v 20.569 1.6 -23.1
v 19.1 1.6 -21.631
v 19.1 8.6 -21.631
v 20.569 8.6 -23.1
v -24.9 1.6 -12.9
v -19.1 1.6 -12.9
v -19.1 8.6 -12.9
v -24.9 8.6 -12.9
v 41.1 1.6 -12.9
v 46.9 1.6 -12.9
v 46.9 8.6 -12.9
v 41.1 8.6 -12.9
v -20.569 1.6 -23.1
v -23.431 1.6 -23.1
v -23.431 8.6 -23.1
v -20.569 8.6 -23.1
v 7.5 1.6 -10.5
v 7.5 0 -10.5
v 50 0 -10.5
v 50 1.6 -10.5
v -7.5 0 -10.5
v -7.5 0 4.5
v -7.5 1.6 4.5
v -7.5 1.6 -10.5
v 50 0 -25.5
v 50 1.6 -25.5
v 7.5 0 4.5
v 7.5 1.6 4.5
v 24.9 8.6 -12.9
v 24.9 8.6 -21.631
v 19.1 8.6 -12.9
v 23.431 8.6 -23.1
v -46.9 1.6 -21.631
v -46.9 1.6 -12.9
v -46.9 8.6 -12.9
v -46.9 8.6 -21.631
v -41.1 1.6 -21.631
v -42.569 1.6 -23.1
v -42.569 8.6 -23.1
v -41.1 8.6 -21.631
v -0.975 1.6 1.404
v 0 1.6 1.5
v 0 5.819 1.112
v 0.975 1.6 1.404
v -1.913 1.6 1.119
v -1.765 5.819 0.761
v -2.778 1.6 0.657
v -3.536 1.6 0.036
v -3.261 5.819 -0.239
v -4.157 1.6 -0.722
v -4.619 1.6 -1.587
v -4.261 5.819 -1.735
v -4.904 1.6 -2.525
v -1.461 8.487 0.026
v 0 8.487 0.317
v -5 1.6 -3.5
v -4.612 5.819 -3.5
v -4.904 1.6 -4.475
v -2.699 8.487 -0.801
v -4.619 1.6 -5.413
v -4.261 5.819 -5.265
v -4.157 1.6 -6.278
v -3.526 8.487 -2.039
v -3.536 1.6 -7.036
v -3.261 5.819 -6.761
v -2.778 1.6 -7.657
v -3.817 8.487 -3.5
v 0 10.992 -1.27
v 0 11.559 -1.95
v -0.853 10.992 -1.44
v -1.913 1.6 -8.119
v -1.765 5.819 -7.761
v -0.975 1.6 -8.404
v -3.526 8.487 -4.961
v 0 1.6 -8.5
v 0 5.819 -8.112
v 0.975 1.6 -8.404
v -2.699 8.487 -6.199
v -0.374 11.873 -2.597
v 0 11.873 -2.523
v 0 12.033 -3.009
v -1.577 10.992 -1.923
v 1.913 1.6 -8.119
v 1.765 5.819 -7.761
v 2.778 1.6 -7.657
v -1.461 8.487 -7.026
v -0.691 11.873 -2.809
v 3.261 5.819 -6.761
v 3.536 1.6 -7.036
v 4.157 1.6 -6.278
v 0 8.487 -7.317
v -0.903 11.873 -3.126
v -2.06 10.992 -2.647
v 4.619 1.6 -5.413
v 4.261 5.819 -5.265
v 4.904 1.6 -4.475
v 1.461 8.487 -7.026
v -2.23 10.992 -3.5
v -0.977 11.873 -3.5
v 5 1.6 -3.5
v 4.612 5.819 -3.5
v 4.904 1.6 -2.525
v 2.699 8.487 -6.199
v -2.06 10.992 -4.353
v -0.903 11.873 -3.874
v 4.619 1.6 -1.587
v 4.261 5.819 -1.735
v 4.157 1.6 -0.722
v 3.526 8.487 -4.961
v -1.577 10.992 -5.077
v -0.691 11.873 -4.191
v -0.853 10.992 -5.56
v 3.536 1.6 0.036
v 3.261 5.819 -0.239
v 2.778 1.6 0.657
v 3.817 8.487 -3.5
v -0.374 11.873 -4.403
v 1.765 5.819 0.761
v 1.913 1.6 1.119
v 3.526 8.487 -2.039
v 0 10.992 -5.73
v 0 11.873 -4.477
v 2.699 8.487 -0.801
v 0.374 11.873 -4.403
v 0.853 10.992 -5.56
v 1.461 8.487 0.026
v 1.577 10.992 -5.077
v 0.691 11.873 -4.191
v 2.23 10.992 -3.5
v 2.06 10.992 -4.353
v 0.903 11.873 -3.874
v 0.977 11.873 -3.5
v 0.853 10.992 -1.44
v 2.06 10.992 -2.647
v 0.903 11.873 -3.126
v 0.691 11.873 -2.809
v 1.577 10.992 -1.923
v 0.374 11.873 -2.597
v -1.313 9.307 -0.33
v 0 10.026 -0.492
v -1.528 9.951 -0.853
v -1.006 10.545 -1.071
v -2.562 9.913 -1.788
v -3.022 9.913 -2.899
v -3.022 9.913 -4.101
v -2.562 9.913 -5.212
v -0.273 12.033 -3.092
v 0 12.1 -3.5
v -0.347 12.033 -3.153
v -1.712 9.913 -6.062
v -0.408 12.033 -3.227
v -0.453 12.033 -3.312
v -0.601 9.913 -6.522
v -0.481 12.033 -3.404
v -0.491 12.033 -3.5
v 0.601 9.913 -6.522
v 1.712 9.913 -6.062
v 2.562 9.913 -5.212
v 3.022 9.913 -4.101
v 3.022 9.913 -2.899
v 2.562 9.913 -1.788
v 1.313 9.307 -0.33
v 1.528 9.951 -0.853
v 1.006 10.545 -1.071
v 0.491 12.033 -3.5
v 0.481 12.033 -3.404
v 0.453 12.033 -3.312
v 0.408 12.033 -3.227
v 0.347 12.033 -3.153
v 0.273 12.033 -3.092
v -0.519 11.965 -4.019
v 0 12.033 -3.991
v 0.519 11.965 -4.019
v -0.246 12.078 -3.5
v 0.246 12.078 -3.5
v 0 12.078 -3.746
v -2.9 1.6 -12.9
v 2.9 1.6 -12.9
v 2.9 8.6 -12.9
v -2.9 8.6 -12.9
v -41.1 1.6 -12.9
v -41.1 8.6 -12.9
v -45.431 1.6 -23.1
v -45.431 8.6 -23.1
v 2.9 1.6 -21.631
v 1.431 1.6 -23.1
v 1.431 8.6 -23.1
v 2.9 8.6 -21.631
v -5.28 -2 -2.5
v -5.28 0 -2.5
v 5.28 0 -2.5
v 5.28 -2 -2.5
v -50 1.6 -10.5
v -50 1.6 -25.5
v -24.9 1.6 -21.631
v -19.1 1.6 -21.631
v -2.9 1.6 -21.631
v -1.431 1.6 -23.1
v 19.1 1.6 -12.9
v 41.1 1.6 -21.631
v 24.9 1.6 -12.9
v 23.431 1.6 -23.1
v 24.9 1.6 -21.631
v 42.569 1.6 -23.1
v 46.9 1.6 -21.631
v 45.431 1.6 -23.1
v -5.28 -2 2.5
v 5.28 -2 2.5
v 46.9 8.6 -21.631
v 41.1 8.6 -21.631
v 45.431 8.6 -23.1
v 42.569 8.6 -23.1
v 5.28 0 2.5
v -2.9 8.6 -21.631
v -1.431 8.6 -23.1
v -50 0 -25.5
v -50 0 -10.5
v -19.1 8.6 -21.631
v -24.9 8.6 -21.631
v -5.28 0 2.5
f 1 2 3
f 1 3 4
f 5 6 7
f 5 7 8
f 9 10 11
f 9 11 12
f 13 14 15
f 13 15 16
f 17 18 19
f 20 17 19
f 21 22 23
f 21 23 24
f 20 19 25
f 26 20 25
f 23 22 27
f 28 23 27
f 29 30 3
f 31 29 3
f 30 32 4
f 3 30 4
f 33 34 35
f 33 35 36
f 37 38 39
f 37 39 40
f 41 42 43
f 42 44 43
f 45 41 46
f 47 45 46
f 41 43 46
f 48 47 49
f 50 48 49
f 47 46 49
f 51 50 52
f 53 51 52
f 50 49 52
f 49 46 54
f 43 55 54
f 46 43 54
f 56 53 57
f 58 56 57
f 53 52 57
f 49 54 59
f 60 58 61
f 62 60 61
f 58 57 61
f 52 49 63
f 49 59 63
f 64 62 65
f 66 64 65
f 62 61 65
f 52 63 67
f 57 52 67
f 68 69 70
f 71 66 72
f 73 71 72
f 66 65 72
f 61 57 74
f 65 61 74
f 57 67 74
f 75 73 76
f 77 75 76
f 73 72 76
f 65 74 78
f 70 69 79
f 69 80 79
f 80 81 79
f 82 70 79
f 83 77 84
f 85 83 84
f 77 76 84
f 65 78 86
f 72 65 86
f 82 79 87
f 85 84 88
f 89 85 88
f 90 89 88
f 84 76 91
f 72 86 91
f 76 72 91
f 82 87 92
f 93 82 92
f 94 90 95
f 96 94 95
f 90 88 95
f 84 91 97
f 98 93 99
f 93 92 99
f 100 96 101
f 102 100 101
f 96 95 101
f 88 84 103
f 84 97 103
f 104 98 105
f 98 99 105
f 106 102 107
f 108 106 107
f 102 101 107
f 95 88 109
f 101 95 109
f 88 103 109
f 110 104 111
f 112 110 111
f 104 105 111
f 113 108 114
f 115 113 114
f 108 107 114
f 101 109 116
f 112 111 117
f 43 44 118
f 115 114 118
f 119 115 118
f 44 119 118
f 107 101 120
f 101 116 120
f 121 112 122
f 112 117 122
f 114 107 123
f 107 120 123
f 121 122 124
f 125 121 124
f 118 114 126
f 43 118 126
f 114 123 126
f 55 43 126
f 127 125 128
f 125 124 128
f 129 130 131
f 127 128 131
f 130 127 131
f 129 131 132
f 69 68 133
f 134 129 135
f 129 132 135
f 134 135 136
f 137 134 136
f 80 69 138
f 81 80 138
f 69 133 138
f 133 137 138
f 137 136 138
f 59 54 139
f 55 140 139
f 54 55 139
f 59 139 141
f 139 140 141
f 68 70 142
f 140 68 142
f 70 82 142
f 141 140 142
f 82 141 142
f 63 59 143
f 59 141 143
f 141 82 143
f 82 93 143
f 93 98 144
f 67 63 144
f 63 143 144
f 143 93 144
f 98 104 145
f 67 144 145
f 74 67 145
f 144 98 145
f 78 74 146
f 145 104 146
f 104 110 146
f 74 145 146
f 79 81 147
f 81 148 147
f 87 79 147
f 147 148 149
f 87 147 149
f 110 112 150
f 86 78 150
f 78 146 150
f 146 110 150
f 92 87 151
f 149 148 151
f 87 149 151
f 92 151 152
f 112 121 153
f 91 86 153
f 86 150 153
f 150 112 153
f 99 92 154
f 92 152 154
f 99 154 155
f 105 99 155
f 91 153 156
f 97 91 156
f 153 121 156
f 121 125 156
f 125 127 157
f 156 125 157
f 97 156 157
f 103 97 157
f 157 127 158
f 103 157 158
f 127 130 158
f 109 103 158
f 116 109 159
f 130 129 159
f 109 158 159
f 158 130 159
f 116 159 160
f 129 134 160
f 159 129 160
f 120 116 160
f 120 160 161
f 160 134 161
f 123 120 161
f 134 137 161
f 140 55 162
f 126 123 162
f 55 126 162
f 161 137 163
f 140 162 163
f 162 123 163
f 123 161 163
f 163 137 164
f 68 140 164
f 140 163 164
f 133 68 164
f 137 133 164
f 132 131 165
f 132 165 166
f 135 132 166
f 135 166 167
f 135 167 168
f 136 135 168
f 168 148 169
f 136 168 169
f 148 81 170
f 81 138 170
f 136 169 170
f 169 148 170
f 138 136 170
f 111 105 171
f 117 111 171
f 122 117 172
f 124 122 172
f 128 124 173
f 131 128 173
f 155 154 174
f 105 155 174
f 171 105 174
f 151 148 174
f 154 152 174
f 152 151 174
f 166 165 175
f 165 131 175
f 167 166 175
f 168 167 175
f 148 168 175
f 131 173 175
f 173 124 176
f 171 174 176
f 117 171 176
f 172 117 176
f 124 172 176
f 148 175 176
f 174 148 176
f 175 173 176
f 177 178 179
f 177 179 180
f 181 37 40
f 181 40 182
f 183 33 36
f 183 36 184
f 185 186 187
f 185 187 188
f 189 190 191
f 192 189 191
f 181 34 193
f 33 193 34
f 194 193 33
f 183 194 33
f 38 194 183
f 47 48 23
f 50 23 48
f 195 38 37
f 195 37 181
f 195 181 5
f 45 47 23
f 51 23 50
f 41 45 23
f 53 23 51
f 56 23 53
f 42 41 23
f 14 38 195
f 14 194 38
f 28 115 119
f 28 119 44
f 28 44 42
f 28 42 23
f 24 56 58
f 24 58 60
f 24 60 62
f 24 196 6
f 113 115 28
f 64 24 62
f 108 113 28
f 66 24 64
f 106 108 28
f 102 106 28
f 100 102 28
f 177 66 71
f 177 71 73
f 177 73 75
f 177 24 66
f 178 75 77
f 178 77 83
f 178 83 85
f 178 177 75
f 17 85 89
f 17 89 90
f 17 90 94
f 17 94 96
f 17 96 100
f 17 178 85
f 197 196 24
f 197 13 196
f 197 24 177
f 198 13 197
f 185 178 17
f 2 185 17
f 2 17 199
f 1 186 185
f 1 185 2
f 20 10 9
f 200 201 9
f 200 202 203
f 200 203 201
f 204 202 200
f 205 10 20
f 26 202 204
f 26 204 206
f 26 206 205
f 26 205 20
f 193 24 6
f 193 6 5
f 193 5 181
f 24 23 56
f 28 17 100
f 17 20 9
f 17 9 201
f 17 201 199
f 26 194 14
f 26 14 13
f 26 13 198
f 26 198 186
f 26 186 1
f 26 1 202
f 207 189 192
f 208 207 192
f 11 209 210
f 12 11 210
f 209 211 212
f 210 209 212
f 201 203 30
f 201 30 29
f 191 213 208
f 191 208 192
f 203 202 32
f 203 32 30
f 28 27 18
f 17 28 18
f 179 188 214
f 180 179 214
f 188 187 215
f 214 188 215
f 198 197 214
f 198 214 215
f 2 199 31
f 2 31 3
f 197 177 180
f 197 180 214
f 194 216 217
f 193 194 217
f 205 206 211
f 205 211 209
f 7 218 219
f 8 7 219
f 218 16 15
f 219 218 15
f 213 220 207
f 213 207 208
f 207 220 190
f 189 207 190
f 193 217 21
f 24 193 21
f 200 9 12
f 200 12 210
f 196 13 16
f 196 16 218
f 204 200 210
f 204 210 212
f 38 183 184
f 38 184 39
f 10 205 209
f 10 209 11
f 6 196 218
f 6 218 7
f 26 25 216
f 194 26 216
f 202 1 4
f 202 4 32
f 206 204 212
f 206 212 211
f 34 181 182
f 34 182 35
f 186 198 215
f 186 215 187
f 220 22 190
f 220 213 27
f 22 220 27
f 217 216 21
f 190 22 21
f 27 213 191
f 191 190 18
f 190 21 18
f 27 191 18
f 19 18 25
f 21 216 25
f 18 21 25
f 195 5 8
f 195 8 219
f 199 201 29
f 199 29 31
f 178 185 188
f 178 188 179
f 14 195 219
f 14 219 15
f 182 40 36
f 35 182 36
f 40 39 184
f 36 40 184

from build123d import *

# Parameters (mm, degrees)
BOSS_EXTRUDE1_DEPTH = 1.6
SKETCH1_3_W         = 10.56
SKETCH1_3_H         = 5
BOSS_EXTRUDE2_DEPTH = 2
BOSS_EXTRUDE3_DEPTH = 8.6


with BuildPart() as part:
    # Sketch1 → Boss-Extrude1 (new body)
    with BuildSketch(Plane(origin=(0, 0, 0), x_dir=(1, 0, 0), z_dir=(0, 1, 0))):
        Polygon((-7.5, 10.5), (-7.5, -4.5), (7.5, -4.5), (7.5, 10.5), (50, 10.5), (50, 25.5), (-50, 25.5), (-50, 10.5), align=None)
        Polygon((46.9, 21.630697763), (46.9, 12.9), (41.1, 12.9), (41.1, 21.630697763), (42.569302237, 23.1), (45.430697763, 23.1), align=None, mode=Mode.SUBTRACT)
        Polygon((-42.569302237, 23.1), (-41.1, 21.630697763), (-41.1, 12.9), (-46.9, 12.9), (-46.9, 21.630697763), (-45.430697763, 23.1), align=None, mode=Mode.SUBTRACT)
        Polygon((-20.569302237, 23.1), (-19.1, 21.630697763), (-19.1, 12.9), (-24.9, 12.9), (-24.9, 21.630697763), (-23.430697763, 23.1), align=None, mode=Mode.SUBTRACT)
        Polygon((2.9, 12.9), (-2.9, 12.9), (-2.9, 21.630697763), (-1.430697763, 23.1), (1.430697763, 23.1), (2.9, 21.630697763), align=None, mode=Mode.SUBTRACT)
        Polygon((23.430697763, 23.1), (24.9, 21.630697763), (24.9, 12.9), (19.1, 12.9), (19.1, 21.630697763), (20.569302237, 23.1), align=None, mode=Mode.SUBTRACT)
    extrude(amount=BOSS_EXTRUDE1_DEPTH)

    # Sketch1<3> → Boss-Extrude2 (add)
    with BuildSketch(Plane(origin=(0, 0, 0), x_dir=(1, 0, 0), z_dir=(0, 1, 0))):
        Rectangle(SKETCH1_3_W, SKETCH1_3_H)
    extrude(amount=-BOSS_EXTRUDE2_DEPTH)

    # Sketch1<4> → Boss-Extrude3 (add)
    with BuildSketch(Plane(origin=(0, 0, 0), x_dir=(1, 0, 0), z_dir=(0, 1, 0))):
        Polygon((-2.9, 21.630697763), (-2.9, 12.9), (2.9, 12.9), (2.9, 21.630697763), (1.430697763, 23.1), (-1.430697763, 23.1), align=None)
        Polygon((24.9, 12.9), (24.9, 21.630697763), (23.430697763, 23.1), (20.569302237, 23.1), (19.1, 21.630697763), (19.1, 12.9), align=None)
        Polygon((46.9, 12.9), (46.9, 21.630697763), (45.430697763, 23.1), (42.569302237, 23.1), (41.1, 21.630697763), (41.1, 12.9), align=None)
        Polygon((-19.1, 12.9), (-19.1, 21.630697763), (-20.569302237, 23.1), (-23.430697763, 23.1), (-24.9, 21.630697763), (-24.9, 12.9), align=None)
        Polygon((-41.1, 12.9), (-41.1, 21.630697763), (-42.569302237, 23.1), (-45.430697763, 23.1), (-46.9, 21.630697763), (-46.9, 12.9), align=None)
    extrude(amount=BOSS_EXTRUDE3_DEPTH)

    # Sketch3 → Revolve2 (revolve)
    with BuildSketch(Plane(origin=(0, 0, 0), x_dir=(0, 0, -1), z_dir=(1, 0, 0))):
        with BuildLine():
            add(Edge.make_bspline(
                [(-1.5, 1.6), (-1.5, 8.223178145), (1, 11.999705618), (3.5, 12.1)],
                knots=[0, 0, 0, 0, 0.5, 0.5, 0.5, 0.5], degree=3))
            Line((-1.5, 1.6), (3.5, 1.6))
            Line((3.5, 1.6), (3.5, 12.1))
        make_face()
    revolve(axis=Axis((0, 12.1, -3.5), (0, -1, 0)))


solid = part.part
